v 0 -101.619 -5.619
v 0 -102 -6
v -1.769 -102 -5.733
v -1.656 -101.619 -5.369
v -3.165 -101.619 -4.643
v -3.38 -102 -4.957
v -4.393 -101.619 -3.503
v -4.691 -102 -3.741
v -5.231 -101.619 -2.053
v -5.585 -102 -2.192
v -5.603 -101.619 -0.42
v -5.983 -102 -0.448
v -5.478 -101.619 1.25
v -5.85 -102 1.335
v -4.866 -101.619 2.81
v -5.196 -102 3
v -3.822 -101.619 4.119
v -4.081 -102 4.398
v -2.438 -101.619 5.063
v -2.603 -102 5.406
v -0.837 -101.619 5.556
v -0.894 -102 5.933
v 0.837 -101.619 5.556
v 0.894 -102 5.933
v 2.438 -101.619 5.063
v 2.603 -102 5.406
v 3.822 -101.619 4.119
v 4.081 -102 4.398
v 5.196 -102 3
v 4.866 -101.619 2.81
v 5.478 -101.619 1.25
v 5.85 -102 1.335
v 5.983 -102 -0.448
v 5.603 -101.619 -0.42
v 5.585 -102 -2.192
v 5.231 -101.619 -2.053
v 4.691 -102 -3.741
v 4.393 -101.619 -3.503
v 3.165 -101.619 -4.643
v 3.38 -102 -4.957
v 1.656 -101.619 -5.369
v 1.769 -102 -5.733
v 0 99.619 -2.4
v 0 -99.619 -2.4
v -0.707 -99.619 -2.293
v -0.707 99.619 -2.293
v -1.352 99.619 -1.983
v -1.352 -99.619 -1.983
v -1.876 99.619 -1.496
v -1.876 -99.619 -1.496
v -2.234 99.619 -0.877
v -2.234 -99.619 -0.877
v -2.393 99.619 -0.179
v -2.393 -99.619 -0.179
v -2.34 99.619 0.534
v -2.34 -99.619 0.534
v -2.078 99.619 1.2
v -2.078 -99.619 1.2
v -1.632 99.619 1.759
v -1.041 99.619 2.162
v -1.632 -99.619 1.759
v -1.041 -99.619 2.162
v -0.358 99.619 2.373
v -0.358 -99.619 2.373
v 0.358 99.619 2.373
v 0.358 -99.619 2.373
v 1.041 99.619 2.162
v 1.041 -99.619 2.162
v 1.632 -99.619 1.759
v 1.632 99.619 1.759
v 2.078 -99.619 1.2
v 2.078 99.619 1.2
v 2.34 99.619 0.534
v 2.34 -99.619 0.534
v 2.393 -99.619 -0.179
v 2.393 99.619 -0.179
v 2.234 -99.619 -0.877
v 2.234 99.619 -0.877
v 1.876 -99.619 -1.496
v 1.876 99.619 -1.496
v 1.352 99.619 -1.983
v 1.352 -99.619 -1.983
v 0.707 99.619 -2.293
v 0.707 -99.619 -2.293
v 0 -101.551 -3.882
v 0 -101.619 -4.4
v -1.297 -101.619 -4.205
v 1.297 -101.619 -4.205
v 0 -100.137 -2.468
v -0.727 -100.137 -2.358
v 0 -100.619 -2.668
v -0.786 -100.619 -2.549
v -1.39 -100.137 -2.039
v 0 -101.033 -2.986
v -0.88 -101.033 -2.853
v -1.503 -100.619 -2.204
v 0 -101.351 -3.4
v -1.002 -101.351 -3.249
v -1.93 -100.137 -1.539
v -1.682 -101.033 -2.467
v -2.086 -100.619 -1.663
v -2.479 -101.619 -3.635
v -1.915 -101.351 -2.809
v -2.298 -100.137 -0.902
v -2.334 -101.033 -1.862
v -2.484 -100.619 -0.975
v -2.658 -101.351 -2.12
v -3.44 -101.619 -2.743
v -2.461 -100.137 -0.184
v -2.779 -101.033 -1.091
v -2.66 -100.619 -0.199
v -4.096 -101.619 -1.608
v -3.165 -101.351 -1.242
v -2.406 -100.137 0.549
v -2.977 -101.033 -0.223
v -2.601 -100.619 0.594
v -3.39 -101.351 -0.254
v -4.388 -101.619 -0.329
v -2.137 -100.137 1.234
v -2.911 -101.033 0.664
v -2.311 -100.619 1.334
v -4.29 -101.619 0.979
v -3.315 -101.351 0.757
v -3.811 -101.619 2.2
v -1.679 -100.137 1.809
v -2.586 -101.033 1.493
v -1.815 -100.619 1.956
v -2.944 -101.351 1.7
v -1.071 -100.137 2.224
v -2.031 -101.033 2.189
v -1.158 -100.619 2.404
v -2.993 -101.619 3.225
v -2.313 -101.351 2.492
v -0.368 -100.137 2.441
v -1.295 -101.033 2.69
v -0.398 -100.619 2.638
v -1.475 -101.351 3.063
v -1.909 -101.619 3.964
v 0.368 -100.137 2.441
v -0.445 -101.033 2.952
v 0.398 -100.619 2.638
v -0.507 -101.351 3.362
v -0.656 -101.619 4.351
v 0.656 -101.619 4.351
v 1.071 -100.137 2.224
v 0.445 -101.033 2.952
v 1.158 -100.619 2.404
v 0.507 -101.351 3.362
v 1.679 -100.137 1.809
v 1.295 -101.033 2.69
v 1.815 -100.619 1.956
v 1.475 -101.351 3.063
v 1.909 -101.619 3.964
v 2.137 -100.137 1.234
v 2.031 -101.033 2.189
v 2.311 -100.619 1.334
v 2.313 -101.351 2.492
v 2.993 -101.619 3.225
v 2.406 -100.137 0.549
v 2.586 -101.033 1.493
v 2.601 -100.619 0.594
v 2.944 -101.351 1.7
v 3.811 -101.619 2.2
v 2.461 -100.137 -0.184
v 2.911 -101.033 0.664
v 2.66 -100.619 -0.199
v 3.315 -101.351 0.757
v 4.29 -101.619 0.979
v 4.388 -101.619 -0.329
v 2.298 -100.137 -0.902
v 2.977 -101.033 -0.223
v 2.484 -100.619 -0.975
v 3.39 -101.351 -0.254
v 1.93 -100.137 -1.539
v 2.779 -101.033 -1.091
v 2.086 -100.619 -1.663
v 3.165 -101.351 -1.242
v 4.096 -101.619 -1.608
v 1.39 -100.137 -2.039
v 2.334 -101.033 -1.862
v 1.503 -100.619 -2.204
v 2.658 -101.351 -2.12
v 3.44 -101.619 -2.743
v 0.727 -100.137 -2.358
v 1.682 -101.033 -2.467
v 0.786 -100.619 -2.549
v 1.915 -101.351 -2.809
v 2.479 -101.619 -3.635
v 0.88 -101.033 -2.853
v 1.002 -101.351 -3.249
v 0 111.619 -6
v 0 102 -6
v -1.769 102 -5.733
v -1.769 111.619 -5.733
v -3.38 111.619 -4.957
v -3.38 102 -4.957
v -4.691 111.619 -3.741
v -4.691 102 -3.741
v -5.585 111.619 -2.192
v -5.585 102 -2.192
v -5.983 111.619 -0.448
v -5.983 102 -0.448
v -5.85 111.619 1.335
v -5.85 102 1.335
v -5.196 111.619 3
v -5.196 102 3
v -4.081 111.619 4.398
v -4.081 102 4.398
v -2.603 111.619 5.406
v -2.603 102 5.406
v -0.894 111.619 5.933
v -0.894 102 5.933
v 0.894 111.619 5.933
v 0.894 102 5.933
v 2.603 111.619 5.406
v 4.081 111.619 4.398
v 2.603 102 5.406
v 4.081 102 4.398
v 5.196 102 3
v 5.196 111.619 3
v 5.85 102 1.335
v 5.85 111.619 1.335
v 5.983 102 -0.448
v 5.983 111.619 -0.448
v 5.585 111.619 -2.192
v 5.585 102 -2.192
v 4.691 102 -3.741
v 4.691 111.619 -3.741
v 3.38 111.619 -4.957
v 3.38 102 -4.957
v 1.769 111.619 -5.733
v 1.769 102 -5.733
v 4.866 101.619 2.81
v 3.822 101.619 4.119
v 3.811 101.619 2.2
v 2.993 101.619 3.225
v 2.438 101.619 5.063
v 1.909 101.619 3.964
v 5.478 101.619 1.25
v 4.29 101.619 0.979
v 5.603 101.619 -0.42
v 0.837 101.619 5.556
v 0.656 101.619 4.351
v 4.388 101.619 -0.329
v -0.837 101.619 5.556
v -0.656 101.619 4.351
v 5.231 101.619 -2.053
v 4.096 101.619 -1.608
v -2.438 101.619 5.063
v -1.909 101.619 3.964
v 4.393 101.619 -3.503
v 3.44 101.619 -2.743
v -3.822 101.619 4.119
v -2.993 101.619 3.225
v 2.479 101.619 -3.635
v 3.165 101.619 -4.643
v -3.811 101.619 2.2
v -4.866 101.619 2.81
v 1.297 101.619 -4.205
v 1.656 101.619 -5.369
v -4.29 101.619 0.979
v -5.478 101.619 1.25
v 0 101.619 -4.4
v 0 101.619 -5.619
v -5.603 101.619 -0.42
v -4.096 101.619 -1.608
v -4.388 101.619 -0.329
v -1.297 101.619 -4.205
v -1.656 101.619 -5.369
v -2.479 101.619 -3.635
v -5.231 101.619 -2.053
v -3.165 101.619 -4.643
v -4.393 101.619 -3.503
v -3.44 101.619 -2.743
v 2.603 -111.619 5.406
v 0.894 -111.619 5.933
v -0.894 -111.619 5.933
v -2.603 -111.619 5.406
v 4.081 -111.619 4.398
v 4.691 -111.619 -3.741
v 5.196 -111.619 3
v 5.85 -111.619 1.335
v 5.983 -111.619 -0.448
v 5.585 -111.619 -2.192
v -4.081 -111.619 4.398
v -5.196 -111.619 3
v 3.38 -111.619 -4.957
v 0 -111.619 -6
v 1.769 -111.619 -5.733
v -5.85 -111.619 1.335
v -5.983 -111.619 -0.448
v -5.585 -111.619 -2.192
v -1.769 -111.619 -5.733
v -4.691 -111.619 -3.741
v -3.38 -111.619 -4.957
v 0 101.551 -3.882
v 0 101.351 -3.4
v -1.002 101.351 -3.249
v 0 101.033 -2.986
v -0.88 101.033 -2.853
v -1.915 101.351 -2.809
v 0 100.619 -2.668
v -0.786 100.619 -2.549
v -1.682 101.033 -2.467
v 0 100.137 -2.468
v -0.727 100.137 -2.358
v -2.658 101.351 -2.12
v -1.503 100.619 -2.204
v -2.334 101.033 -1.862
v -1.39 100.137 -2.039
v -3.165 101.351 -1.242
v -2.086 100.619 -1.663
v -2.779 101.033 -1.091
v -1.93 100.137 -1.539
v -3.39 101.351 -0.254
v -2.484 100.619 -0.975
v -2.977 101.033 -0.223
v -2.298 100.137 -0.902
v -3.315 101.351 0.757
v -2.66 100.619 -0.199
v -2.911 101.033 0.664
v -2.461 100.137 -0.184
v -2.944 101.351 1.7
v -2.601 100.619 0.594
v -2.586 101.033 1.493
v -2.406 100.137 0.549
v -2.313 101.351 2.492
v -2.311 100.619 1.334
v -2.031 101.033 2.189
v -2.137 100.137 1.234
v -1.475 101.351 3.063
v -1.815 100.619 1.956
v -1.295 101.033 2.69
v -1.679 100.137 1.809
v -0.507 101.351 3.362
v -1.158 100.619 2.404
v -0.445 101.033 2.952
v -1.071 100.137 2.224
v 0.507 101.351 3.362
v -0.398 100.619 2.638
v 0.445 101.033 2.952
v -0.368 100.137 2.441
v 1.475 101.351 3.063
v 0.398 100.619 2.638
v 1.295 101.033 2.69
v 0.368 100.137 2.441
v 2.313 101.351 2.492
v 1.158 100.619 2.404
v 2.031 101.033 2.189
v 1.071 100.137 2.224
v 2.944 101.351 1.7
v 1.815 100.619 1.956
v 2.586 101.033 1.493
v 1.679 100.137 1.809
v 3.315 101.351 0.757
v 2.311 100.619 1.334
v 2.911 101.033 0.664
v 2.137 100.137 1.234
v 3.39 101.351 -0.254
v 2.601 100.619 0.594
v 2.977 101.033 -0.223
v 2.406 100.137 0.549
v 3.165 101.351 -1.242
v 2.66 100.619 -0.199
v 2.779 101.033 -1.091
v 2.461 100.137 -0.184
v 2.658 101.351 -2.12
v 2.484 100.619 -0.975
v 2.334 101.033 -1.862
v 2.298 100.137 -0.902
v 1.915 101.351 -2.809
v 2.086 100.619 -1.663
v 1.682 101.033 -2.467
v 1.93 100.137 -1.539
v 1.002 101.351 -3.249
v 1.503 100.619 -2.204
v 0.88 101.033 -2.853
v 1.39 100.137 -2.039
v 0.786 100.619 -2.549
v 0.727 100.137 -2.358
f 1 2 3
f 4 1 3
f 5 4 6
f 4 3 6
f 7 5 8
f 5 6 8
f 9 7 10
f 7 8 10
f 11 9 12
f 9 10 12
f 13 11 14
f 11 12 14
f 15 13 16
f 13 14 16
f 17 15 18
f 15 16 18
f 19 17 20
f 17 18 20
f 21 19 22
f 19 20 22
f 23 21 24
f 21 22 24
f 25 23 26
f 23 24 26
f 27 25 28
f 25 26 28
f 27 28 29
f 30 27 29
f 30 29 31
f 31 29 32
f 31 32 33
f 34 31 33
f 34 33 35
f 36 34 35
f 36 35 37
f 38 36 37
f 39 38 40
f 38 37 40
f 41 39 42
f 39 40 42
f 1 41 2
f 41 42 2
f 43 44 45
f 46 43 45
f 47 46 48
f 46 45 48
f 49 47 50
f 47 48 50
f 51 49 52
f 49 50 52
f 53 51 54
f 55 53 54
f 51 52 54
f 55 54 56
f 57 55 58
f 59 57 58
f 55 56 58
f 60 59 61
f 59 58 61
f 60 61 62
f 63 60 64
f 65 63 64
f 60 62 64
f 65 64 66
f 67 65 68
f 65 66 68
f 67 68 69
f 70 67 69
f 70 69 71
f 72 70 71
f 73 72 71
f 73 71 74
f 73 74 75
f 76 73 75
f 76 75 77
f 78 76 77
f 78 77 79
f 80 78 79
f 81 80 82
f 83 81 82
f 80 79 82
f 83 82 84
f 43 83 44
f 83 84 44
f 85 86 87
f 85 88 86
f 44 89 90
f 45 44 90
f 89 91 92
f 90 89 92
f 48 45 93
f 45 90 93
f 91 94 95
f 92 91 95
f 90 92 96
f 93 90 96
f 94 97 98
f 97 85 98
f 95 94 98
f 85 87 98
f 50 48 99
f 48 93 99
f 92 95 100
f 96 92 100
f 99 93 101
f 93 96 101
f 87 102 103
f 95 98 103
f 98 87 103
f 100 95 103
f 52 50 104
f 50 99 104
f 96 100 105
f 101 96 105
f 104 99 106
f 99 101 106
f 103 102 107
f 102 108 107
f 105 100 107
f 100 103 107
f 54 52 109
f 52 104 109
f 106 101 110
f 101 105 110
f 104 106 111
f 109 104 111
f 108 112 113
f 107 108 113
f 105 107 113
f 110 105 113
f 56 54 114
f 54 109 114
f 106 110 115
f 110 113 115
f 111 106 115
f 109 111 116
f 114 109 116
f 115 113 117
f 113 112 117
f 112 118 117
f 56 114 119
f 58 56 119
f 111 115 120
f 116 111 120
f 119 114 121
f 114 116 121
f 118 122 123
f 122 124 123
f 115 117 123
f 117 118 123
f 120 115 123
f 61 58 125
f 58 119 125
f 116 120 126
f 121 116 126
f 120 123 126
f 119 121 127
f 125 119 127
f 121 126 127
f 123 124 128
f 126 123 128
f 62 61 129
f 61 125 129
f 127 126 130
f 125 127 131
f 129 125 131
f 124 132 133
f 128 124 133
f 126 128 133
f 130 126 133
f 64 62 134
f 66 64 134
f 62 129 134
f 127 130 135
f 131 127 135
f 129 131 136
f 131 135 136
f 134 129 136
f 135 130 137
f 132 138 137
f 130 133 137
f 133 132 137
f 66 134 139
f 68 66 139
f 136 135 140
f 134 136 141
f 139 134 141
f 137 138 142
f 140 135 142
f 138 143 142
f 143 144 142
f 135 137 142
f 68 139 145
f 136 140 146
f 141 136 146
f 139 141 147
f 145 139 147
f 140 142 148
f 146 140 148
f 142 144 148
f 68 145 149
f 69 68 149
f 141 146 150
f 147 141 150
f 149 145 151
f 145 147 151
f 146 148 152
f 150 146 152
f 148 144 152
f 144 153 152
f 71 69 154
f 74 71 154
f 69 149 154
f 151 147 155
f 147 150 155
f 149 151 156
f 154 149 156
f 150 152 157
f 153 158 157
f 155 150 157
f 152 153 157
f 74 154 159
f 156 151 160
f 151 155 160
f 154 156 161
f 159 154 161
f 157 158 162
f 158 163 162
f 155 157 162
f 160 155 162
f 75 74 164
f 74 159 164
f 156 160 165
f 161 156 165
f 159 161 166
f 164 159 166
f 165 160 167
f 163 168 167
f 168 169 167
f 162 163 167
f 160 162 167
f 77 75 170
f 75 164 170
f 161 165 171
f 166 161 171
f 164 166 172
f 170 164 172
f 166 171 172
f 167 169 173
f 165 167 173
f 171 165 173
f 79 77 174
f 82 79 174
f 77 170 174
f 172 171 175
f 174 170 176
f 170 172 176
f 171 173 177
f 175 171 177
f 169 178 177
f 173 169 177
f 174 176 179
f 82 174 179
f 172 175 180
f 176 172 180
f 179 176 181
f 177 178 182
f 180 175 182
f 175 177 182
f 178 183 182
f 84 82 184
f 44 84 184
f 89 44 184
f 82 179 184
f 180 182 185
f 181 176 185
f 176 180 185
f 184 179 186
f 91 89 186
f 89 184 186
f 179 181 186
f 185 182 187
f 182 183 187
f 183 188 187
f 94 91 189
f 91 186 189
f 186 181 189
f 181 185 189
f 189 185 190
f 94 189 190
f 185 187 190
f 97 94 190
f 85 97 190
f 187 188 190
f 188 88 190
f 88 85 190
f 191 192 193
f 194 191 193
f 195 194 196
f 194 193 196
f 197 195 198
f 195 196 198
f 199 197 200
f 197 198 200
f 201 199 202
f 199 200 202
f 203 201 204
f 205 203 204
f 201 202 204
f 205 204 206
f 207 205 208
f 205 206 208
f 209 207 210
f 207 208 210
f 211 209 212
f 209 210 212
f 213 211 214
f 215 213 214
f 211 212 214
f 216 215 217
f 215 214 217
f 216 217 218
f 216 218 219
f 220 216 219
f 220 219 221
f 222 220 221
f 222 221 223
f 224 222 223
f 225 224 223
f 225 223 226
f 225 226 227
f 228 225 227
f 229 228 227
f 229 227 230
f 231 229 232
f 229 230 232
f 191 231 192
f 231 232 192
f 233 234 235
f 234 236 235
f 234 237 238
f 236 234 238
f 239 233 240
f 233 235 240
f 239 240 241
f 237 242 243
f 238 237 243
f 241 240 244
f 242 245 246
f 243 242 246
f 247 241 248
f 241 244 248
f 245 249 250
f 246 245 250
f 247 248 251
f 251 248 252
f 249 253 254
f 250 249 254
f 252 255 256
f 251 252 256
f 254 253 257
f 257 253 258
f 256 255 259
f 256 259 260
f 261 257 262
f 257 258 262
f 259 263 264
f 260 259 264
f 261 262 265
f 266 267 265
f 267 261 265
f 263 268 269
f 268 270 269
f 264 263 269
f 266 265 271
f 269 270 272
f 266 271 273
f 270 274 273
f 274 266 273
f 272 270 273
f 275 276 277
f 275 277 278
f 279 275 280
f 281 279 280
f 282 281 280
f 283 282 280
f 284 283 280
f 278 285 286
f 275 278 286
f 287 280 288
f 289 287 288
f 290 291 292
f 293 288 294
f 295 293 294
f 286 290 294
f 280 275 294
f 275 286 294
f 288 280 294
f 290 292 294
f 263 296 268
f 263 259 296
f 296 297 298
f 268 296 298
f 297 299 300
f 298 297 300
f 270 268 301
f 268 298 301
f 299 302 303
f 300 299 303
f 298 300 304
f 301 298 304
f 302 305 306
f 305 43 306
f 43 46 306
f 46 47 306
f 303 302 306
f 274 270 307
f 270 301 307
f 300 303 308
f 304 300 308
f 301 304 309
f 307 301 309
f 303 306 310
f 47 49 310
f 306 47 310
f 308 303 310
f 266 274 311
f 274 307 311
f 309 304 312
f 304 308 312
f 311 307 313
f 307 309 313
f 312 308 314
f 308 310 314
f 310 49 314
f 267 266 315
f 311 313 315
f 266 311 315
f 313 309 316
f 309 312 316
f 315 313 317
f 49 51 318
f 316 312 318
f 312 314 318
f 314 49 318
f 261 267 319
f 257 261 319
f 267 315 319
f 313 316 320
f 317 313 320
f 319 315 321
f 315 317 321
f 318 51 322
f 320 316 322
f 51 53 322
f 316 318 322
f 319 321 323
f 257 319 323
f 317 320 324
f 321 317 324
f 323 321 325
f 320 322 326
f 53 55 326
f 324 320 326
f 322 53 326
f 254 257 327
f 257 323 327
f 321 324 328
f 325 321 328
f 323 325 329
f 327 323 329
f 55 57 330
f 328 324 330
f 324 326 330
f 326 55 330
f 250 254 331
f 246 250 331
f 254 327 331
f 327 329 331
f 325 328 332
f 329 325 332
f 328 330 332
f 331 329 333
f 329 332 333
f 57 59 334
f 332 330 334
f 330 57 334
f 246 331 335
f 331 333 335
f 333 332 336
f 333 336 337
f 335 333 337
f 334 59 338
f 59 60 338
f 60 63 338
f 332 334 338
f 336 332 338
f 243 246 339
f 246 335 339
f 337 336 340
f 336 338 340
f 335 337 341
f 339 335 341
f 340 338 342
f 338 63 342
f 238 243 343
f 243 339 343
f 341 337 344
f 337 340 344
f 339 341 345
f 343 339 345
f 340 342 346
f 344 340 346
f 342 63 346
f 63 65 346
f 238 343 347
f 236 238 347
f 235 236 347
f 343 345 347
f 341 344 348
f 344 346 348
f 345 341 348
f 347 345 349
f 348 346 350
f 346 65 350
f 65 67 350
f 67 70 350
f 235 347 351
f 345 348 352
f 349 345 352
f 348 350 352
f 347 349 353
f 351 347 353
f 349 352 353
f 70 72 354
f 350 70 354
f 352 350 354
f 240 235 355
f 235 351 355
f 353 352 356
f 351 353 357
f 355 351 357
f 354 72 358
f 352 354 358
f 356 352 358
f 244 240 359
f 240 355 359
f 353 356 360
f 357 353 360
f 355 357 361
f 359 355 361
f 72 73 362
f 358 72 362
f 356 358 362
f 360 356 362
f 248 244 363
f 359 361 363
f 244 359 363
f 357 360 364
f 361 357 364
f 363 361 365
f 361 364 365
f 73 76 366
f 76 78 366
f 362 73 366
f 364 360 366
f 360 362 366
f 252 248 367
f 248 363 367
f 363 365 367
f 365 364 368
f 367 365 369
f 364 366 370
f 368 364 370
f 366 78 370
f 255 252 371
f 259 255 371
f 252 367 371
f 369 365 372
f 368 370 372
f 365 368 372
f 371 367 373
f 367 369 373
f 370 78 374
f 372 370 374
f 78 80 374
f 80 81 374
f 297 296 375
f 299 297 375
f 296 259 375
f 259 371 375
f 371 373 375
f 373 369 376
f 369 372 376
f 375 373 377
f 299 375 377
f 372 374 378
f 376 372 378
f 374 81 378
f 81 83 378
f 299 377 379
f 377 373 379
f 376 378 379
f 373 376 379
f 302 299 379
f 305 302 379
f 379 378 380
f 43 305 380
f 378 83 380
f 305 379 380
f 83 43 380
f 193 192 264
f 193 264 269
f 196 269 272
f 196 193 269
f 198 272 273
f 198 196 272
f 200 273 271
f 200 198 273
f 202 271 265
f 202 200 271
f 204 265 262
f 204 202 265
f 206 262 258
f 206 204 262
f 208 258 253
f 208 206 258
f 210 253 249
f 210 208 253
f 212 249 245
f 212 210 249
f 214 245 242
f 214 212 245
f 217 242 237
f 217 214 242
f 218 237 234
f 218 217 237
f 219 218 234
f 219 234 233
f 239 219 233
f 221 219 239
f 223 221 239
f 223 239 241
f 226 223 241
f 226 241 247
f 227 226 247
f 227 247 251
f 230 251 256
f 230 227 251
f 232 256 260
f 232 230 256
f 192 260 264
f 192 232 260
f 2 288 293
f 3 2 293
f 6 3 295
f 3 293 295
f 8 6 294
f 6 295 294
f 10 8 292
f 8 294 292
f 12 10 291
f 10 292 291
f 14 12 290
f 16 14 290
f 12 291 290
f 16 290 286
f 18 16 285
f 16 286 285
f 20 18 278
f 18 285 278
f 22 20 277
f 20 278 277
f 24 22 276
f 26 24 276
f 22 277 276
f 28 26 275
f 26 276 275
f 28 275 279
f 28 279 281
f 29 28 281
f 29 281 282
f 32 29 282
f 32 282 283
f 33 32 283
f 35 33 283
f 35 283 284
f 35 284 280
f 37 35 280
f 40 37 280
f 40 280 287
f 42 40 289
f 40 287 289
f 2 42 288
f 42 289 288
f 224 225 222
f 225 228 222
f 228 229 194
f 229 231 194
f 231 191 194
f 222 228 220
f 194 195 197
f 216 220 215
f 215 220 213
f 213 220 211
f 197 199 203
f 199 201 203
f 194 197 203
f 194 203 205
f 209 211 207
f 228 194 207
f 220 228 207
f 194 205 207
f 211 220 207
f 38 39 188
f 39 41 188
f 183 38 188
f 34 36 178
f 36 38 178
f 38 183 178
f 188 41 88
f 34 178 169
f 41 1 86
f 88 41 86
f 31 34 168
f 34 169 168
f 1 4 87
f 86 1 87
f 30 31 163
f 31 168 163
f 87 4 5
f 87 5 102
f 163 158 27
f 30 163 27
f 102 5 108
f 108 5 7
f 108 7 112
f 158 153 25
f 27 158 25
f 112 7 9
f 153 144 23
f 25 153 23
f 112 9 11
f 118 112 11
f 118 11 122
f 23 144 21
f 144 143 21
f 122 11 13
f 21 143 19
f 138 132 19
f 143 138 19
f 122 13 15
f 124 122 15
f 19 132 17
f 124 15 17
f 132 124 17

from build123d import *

# Parameters (mm, degrees)
FILLET1_R     = 2
CHAMFER1_SIZE = 0.381


with BuildPart() as part:
    # Sketch1 → Revolve1 (revolve)
    with BuildSketch(Plane.XY, mode=Mode.PRIVATE) as revolve1_sk:
        Polygon((0, -111.618928003), (0, 111.618928003), (6, 111.618928003), (6, 101.618928003), (2.4, 101.618928003), (2.4, -101.618928003), (6, -101.618928003), (6, -111.618928003), align=None)
    revolve(revolve1_sk.sketch.rotate(Axis((0, 0, 0), (0, 1, 0)), 90), axis=Axis((0, 0, 0), (0, 1, 0)))  # turned: the seam where the file's is

    # Fillet1
    fillet1_edges = [part.edges().sort_by_distance(p)[0] for p in [
        (0, 101.618928003, 2.4),
        (0, -101.618928003, 2.4),
    ]]
    fillet(fillet1_edges, radius=FILLET1_R)

    # Chamfer1
    chamfer1_edges = [part.edges().sort_by_distance(p)[0] for p in [
        (0, -101.618928003, 6),
        (0, 101.618928003, 6),
    ]]
    chamfer(chamfer1_edges, length=CHAMFER1_SIZE)


solid = part.part
